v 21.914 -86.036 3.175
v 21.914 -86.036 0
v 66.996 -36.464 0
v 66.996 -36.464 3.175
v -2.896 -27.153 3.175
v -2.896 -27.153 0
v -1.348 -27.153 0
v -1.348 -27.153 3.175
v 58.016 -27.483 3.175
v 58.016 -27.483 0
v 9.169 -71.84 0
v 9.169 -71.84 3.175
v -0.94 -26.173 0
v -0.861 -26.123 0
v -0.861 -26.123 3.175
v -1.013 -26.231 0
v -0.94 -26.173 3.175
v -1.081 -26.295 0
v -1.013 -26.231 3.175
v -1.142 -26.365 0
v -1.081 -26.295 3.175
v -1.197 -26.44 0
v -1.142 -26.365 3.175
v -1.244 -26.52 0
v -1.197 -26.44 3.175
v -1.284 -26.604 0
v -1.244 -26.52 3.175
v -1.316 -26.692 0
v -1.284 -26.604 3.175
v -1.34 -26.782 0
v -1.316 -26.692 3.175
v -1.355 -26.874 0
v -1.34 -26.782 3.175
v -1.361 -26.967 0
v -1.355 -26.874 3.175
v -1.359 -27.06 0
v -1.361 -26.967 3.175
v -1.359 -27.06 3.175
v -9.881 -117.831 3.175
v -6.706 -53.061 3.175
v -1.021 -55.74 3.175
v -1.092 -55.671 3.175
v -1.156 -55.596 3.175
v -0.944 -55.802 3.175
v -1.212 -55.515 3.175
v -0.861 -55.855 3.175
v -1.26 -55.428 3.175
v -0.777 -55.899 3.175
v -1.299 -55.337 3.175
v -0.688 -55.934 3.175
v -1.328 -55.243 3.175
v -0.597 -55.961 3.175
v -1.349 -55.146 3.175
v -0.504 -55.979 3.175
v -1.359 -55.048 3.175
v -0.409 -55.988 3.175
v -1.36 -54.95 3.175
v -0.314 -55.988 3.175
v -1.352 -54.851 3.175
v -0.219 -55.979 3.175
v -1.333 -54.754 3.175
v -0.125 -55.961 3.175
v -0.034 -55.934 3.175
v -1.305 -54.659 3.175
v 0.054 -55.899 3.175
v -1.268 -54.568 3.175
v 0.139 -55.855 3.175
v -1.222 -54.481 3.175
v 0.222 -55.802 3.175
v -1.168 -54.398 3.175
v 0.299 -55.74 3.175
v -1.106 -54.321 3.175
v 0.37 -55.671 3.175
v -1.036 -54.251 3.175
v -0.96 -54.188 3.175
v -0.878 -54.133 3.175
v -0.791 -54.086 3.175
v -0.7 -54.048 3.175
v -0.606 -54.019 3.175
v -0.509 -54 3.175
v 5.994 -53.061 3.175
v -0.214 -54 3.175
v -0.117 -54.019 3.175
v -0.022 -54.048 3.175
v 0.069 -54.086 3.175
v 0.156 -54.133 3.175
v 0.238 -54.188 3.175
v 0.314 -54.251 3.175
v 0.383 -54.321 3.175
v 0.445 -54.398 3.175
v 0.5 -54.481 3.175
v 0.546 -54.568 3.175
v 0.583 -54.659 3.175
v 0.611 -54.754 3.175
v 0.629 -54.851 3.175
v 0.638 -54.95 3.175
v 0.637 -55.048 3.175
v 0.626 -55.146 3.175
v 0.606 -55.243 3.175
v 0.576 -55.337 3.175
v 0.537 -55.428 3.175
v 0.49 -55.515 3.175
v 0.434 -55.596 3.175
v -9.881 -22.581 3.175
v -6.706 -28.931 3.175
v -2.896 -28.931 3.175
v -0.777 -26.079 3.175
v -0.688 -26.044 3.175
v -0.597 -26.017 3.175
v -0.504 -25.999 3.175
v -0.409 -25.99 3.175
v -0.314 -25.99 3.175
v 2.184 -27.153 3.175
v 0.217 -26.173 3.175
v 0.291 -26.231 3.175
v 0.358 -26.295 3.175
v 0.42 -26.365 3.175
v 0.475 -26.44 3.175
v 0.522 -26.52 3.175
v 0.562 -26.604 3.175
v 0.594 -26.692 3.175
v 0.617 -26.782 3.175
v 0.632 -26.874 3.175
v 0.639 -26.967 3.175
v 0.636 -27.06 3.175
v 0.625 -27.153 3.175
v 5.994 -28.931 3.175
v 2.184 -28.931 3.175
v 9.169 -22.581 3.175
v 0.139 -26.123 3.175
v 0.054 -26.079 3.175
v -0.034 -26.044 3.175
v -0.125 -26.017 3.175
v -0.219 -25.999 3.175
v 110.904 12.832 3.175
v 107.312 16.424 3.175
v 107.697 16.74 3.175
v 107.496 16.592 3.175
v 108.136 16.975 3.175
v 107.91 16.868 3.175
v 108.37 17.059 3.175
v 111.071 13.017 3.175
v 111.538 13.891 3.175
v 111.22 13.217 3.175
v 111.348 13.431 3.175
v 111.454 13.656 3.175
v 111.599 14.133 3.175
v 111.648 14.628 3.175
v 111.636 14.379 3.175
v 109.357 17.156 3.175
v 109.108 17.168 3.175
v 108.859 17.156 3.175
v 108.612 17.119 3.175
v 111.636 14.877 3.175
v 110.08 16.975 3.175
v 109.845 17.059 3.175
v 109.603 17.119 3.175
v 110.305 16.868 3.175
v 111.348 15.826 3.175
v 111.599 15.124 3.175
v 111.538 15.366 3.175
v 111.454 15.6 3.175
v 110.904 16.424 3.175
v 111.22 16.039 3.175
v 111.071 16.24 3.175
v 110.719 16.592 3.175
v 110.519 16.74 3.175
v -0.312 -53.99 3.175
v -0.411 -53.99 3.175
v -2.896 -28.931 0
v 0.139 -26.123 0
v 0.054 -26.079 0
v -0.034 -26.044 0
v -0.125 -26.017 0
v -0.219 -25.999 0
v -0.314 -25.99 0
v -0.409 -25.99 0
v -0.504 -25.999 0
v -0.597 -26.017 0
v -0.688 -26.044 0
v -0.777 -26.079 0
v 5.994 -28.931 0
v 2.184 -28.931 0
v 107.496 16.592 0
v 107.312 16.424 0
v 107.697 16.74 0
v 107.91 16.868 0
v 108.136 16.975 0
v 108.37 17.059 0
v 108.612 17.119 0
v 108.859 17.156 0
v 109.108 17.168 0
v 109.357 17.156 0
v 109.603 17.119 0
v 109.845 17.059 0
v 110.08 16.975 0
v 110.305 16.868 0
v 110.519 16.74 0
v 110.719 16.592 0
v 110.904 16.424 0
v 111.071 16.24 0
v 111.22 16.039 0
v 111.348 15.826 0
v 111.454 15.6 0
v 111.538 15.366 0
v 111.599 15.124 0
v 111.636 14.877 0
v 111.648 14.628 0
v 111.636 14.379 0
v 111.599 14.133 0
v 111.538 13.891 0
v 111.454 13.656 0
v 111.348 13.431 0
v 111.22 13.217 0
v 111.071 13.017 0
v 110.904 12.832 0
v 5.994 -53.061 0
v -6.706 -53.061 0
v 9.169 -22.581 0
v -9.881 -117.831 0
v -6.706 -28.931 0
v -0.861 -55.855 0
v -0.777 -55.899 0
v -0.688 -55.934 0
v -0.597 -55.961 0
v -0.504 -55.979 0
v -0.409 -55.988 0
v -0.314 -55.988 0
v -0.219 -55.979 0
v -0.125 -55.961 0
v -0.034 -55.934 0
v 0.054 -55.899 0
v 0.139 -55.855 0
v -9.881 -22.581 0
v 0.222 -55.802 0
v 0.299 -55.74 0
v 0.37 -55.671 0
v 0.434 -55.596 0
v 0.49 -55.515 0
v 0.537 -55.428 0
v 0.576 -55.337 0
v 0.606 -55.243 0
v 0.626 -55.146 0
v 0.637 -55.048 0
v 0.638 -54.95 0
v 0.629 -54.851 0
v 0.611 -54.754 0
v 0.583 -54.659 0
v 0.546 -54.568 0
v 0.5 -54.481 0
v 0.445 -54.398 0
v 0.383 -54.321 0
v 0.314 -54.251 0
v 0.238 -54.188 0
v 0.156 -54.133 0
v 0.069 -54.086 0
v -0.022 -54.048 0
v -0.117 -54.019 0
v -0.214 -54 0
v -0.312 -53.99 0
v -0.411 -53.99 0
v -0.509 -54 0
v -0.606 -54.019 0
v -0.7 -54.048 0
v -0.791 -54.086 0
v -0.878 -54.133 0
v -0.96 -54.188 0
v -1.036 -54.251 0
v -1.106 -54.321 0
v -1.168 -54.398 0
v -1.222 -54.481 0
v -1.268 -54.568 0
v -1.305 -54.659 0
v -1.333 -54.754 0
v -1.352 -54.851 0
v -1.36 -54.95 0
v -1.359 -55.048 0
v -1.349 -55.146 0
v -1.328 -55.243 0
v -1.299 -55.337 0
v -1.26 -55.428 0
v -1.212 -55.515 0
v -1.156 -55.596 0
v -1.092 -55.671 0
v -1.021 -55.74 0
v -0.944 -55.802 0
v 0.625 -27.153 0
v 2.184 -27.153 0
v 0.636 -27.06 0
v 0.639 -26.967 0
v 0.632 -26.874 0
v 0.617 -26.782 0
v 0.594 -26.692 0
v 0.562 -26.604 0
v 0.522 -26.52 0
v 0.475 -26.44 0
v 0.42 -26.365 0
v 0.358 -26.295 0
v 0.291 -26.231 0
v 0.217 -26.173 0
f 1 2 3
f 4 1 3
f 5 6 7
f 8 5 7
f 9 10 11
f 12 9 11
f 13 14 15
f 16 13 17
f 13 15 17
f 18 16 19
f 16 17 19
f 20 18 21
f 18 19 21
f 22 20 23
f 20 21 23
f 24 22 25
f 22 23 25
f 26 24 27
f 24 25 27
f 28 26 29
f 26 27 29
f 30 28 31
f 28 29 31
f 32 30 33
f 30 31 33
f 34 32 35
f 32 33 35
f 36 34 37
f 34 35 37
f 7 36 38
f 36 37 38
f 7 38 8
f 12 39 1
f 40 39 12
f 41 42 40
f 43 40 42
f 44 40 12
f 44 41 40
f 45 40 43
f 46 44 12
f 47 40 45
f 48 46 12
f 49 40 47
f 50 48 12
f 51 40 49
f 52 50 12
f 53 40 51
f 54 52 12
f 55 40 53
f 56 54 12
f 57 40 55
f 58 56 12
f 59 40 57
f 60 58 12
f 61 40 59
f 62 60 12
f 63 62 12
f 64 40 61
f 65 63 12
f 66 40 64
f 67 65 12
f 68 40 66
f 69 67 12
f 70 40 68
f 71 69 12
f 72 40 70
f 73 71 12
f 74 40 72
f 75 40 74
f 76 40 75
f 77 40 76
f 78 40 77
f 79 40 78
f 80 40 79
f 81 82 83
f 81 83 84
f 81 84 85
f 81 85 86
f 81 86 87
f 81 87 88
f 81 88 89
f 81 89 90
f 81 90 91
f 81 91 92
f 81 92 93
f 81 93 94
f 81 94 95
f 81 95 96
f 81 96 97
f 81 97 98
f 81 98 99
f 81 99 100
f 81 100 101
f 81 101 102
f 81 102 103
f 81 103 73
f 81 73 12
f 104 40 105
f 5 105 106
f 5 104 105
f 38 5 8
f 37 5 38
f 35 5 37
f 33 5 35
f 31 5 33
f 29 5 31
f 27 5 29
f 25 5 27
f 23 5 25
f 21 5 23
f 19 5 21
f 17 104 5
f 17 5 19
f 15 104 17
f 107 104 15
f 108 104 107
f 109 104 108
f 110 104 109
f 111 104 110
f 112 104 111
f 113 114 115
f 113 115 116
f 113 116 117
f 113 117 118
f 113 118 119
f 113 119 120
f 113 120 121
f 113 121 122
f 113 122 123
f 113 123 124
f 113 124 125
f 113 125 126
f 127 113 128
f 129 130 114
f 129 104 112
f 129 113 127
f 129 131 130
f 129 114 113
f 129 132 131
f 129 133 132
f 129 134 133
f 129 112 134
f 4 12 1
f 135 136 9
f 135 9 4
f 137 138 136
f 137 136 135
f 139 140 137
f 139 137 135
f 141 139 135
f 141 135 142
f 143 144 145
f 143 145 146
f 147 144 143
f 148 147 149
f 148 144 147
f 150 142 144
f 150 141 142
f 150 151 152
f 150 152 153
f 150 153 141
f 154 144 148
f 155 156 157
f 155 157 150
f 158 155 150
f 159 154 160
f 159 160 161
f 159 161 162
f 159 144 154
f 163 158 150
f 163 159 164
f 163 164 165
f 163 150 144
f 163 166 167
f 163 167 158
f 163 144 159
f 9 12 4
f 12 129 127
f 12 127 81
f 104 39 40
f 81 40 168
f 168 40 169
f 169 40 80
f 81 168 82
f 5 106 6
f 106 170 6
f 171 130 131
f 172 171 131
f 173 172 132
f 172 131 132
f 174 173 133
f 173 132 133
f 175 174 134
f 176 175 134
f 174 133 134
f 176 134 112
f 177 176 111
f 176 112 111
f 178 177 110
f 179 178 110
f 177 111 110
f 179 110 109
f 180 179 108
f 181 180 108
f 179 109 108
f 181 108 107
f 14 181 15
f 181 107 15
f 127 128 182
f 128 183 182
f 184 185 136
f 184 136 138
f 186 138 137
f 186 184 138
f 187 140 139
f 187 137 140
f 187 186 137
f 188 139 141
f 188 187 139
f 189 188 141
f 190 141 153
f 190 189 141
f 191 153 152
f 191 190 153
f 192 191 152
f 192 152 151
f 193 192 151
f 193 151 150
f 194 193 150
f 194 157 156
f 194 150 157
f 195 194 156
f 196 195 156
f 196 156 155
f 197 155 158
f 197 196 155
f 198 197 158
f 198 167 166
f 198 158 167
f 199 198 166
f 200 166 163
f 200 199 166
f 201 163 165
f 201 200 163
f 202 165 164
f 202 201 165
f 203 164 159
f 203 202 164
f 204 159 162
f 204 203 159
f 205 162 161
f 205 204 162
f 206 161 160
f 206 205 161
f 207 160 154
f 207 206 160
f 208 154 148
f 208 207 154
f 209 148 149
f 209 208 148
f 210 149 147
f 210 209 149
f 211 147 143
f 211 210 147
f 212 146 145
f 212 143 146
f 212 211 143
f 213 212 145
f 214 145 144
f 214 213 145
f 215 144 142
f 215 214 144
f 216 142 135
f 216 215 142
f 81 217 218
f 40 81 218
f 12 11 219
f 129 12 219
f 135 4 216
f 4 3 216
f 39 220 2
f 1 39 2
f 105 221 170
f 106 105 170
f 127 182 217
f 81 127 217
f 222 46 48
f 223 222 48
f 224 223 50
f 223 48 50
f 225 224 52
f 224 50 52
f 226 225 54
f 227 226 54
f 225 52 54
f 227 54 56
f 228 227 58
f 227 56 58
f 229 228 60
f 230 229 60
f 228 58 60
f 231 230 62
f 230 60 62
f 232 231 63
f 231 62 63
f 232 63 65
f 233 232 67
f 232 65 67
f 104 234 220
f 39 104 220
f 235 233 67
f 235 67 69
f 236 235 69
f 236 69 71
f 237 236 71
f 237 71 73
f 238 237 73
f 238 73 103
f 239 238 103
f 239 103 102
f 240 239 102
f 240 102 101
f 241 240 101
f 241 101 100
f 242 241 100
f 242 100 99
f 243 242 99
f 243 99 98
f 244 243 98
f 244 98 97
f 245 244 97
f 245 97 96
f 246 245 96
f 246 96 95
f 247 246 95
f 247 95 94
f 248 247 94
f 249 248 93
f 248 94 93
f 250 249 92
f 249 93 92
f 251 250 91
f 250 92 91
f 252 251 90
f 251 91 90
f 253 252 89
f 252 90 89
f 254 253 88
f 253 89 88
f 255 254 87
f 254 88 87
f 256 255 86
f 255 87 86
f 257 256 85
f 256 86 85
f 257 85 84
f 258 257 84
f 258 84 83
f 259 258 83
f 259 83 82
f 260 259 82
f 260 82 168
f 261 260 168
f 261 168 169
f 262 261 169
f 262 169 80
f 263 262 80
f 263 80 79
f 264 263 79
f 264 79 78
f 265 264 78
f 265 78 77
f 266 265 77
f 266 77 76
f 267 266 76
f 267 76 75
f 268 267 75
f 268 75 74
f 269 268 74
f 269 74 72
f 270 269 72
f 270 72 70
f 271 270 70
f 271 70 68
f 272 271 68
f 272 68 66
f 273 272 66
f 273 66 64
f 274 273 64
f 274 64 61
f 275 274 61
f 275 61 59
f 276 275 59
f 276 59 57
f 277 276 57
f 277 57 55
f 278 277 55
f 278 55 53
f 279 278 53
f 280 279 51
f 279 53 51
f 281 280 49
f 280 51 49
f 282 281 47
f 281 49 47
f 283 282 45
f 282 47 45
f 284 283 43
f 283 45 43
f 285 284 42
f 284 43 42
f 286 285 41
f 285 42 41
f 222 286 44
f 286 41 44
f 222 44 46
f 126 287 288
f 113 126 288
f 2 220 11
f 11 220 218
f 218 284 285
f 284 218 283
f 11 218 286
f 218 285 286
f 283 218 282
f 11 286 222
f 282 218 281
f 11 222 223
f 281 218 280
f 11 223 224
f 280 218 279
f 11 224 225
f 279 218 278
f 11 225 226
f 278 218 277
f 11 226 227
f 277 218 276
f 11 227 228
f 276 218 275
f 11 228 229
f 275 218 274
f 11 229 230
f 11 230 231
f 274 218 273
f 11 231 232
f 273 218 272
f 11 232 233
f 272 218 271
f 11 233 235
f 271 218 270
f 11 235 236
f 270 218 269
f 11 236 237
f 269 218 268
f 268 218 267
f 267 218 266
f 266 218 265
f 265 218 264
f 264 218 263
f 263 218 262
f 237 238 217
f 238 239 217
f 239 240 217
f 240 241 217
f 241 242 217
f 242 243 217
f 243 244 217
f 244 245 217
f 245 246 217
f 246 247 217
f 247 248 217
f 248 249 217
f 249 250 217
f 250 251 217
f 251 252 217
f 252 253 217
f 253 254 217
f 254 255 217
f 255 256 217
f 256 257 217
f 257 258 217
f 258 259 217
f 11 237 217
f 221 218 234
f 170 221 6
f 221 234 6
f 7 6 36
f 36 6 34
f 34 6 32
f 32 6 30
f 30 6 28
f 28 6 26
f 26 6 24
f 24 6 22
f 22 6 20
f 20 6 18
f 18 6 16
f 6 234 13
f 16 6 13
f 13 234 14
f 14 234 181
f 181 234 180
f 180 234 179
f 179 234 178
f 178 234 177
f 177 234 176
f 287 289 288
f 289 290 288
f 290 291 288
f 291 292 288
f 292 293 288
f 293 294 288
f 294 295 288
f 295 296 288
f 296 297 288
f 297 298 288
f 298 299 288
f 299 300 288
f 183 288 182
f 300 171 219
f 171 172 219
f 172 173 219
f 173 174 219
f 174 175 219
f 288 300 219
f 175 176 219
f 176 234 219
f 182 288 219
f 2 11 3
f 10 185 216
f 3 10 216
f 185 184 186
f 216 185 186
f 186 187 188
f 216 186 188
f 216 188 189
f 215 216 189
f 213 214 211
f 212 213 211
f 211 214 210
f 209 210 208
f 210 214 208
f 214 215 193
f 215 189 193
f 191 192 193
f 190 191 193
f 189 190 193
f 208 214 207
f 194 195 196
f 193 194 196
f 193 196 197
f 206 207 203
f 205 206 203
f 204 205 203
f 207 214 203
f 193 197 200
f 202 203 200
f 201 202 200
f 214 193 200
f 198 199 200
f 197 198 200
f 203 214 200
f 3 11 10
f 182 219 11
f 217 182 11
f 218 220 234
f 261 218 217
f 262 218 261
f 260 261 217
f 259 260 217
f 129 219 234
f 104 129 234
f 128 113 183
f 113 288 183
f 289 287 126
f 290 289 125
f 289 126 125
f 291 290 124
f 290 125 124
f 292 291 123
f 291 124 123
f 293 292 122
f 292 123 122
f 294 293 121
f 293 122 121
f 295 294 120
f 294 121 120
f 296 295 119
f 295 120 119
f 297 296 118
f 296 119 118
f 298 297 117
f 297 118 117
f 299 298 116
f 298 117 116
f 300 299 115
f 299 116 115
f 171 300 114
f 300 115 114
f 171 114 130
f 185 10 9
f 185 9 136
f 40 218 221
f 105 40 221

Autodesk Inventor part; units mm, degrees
ref_plane "YZ Plane" through (0, 0, 0) normal (1, 0, 0) x (0, 1, 0)
ref_plane "XZ Plane" through (0, 0, 0) normal (0, 1, 0) x (-1, 0, 0)
ref_plane "XY Plane" through (0, 0, 0) normal (0, 0, 1) x (1, 0, 0)
sketch "Sketch1" plane through (0, 0, 0) normal (0, 0, 1) x (1, 0, 0)
  circle A0 centre (-2.4288, -33.7476) radius 3.75 construction
  line L0 (-6.7056, -28.9306) -> (5.9944, -28.9306)
  line L1 (5.9944, -28.9306) -> (5.9944, -53.0606)
  line L2 (5.9944, -53.0606) -> (-6.7056, -53.0606)
  line L3 (-6.7056, -53.0606) -> (-6.7056, -28.9306)
  line L4 (9.1694, -22.5806) -> (-9.8806, -22.5806)
  line L5 (-9.8806, -22.5806) -> (-9.8806, -117.8306)
  line L6 (9.1694, -71.8398) -> (9.1694, -22.5806)
  line L7 (58.0161, -27.4833) -> (9.1694, -71.8398)
  line L8 (-9.8806, -117.8306) -> (53.7075, -54.2425) construction
  line L9 (115.843, 7.893) -> (102.3726, 21.3634) construction
  line L10 (102.3726, 21.3634) -> (71.3049, -9.7044) construction
  line L11 (5.9944, -38.1) -> (9.1694, -38.1) construction
  line L12 (-6.7056, -38.1) -> (-9.8806, -38.1) construction
  line L13 (53.7075, -54.2425) -> (40.2371, -40.7721) construction
  line L14 (53.7075, -54.2425) -> (84.7753, -23.1747) construction
  line L15 (40.2371, -40.7721) -> (9.1694, -71.8398) construction
  line L16 (84.7753, -23.1747) -> (71.3049, -9.7044) construction
  line L17 (21.9135, -86.0365) -> (9.1694, -71.8398) construction
  arc A1 (107.3117, 16.4242) -> (110.9038, 12.8321) centre (109.1078, 14.6282) ccw construction
  line L18 (84.7753, -23.1747) -> (115.843, 7.893) construction
  line L19 (71.3049, -9.7044) -> (40.2371, -40.7721) construction
  line L20 (69.2414, -38.7086) -> (55.771, -25.2382) construction
  line L21 (21.9135, -86.0365) -> (66.9963, -36.4636)
  line L22 (-9.8806, -117.8306) -> (21.9135, -86.0365)
  line L23 (66.9963, -36.4636) -> (110.9038, 12.8321)
  line L24 (58.0161, -27.4833) -> (107.3117, 16.4242)
  arc A2 (110.9038, 12.8321) -> (107.3117, 16.4242) centre (109.1078, 14.6282) ccw
  line L25 (2.1844, -28.9306) -> (-2.8956, -28.9306)
  line L26 (-2.8956, -28.9306) -> (-2.8956, -27.1526)
  line L27 (-2.8956, -27.1526) -> (2.1844, -27.1526)
  line L28 (2.1844, -27.1526) -> (2.1844, -28.9306)
  line L29 (5.6388, -37.0253) -> (5.6388, -52.2891) projected
  line L30 (5.4388, -52.4891) -> (-6.1612, -52.4891) projected
  dimension "d4" = 5.9944
  dimension "d5" = 5.9944
  dimension "d6" = 12.7
  dimension "d7" = 24.13
  dimension "d8" = 19.05
  dimension "d9" = 95.25
  dimension "d10" = 6.35
  dimension "d12" = 19.05
  dimension "d13" = 177.8
  dimension "d14" = 45
  dimension "d15" = 5.08
  dimension "d16" = 3.175
  dimension "d17" = 3.175
  dimension "d20" = 1.778
  dimension "d21" = 5.08
  dimension "d22" = 3.81
  dimension "d23" = 0.7056
  dimension "d24" = 0.5715
extrude "Extrusion1" add sketch "Sketch1" along normal blind 3.175
sketch "Sketch2" plane through (0, 0, 3.175) normal (0, 0, 1) x (1, 0, 0)
  arc A0 (-0.8612, -26.1231) -> (0.1388, -26.1231) centre (-0.3612, -26.9891) ccw projected
  arc A1 (0.1388, -55.8551) -> (-0.8612, -55.8551) centre (-0.3612, -54.9891) ccw projected
  circle A2 centre (-0.3612, -54.9891) radius 1
  circle A3 centre (-0.3612, -26.9891) radius 1
  point P0 (0, 0)
extrude "Extrusion2" cut sketch "Sketch2" against normal up to next
properties part number "Toe"
